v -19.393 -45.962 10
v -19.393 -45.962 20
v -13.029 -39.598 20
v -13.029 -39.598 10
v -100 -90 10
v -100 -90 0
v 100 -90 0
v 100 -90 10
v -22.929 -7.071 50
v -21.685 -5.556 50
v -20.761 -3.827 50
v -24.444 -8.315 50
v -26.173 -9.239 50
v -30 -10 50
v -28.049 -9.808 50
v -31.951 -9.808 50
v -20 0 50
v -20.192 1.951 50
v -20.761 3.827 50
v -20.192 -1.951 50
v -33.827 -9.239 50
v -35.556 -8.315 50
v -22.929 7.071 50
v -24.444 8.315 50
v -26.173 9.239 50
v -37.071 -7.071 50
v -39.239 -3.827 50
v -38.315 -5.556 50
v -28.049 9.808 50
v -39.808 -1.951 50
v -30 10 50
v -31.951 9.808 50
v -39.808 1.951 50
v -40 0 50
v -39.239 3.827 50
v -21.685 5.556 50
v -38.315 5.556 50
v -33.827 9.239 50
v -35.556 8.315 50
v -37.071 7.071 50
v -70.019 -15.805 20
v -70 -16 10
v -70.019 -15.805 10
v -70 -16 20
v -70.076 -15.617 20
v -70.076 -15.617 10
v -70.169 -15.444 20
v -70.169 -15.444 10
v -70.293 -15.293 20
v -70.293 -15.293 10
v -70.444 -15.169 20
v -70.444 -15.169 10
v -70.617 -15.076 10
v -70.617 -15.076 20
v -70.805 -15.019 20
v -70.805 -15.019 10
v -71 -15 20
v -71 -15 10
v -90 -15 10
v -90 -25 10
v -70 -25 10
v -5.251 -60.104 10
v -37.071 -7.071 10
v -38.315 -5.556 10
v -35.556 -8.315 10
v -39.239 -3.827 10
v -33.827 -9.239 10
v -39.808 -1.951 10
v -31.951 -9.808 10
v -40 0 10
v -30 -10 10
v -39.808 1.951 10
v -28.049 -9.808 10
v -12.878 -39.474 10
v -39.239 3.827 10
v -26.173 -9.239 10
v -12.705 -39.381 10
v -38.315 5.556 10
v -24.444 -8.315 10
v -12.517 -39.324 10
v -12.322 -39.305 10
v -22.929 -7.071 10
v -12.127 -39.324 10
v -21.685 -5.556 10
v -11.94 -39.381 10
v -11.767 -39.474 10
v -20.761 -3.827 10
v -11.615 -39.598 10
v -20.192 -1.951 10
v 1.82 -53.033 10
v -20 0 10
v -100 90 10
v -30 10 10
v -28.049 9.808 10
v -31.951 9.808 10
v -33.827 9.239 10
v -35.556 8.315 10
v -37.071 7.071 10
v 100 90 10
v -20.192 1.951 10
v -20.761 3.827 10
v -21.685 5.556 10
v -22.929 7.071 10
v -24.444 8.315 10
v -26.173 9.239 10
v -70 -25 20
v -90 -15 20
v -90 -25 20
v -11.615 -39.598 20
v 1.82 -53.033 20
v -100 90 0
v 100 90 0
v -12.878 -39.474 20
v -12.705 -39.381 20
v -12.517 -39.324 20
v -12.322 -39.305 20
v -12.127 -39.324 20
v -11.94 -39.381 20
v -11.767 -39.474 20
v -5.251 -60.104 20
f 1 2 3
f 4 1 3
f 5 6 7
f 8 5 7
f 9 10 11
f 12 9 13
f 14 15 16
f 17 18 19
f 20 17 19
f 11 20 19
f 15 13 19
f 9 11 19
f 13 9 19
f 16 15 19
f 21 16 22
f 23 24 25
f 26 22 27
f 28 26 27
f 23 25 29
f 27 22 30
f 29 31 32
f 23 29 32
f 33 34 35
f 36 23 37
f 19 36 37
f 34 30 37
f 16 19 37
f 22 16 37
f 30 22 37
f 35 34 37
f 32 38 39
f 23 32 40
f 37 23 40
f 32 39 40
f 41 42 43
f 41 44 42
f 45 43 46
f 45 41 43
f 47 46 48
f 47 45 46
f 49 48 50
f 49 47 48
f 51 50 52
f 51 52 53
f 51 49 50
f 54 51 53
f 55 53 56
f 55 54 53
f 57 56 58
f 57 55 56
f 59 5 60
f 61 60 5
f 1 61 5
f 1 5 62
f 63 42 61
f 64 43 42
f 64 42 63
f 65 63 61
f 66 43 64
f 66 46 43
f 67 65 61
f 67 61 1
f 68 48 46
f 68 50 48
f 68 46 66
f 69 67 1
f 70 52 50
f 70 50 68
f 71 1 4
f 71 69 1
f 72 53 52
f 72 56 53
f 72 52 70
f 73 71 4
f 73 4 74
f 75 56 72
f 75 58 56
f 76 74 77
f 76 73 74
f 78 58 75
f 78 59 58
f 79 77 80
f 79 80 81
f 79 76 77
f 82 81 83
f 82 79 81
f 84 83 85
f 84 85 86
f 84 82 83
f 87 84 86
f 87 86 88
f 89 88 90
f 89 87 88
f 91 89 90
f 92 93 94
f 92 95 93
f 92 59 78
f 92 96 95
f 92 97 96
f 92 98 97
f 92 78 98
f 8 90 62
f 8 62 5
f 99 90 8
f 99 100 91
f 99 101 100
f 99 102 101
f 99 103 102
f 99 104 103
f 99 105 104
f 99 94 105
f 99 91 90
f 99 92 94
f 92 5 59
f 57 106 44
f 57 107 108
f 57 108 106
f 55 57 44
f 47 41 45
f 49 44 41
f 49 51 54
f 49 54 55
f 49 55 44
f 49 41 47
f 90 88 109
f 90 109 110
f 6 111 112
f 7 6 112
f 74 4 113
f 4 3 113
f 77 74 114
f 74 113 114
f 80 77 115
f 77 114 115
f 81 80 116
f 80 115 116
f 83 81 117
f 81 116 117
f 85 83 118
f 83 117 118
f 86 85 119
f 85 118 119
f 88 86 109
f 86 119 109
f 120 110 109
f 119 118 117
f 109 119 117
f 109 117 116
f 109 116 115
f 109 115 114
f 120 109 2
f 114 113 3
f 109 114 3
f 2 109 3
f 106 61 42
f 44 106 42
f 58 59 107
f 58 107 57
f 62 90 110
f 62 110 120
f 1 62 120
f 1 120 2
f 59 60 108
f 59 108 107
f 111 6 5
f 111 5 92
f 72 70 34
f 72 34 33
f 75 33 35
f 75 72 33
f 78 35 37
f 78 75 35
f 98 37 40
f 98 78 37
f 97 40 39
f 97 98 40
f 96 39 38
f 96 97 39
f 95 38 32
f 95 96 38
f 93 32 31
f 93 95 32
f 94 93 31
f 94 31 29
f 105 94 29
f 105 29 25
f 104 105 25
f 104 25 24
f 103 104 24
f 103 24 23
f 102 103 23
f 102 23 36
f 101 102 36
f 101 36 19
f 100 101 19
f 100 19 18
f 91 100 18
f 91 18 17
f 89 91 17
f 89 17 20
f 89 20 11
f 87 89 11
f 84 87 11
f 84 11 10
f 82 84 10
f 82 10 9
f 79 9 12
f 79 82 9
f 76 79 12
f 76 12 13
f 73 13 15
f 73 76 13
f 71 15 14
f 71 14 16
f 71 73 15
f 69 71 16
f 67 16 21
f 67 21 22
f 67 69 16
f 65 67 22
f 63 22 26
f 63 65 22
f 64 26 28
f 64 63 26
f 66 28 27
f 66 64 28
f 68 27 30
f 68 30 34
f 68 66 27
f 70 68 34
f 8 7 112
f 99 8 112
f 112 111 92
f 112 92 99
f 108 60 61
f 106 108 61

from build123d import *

# Parameters (mm, degrees)
ESQUISSE1_W        = 200
ESQUISSE1_H        = 180
ESQUISSE1_R        = 10
BOSS_EXTRU_1_DEPTH = 10
ESQUISSE3_R        = 10
BOSS_EXTRU_2_DEPTH = 50
ESQUISSE4_W        = 20
ESQUISSE4_H        = 10
BOSS_EXTRU_3_DEPTH = 10
CONG_1_R           = 1


with BuildPart() as part:
    # Esquisse1 → Boss.-Extru.1 (new body)
    with BuildSketch(Plane.XY):
        Rectangle(ESQUISSE1_W, ESQUISSE1_H)
        with Locations((-30, 0)):
            Circle(ESQUISSE1_R, mode=Mode.SUBTRACT)
    extrude(amount=BOSS_EXTRU_1_DEPTH)

    # Esquisse3 → Boss.-Extru.2 (add)
    with BuildSketch(Plane(origin=(0, 0, 0), x_dir=(-1, 0, 0), z_dir=(0, 0, -1))):
        with Locations((30, 0)):
            Circle(ESQUISSE3_R)
    extrude(amount=-BOSS_EXTRU_2_DEPTH)

    # Esquisse4 → Boss.-Extru.3 (add)
    with BuildSketch(Plane.XY.offset(10)):
        with Locations((-80, -20)):
            Rectangle(ESQUISSE4_W, ESQUISSE4_H)
        Polygon((-12.32233047, -38.890872965), (1.819805153, -53.033008589), (-5.251262658, -60.104076401), (-19.393398282, -45.961940777), align=None)
    extrude(amount=BOSS_EXTRU_3_DEPTH)

    # Congé1
    cong_1_edges = [part.edges().sort_by_distance(p)[0] for p in [
        (-70, -15, 15),
        (-12.32233047, -38.890872965, 15),
    ]]
    fillet(cong_1_edges, radius=CONG_1_R)


solid = part.part
